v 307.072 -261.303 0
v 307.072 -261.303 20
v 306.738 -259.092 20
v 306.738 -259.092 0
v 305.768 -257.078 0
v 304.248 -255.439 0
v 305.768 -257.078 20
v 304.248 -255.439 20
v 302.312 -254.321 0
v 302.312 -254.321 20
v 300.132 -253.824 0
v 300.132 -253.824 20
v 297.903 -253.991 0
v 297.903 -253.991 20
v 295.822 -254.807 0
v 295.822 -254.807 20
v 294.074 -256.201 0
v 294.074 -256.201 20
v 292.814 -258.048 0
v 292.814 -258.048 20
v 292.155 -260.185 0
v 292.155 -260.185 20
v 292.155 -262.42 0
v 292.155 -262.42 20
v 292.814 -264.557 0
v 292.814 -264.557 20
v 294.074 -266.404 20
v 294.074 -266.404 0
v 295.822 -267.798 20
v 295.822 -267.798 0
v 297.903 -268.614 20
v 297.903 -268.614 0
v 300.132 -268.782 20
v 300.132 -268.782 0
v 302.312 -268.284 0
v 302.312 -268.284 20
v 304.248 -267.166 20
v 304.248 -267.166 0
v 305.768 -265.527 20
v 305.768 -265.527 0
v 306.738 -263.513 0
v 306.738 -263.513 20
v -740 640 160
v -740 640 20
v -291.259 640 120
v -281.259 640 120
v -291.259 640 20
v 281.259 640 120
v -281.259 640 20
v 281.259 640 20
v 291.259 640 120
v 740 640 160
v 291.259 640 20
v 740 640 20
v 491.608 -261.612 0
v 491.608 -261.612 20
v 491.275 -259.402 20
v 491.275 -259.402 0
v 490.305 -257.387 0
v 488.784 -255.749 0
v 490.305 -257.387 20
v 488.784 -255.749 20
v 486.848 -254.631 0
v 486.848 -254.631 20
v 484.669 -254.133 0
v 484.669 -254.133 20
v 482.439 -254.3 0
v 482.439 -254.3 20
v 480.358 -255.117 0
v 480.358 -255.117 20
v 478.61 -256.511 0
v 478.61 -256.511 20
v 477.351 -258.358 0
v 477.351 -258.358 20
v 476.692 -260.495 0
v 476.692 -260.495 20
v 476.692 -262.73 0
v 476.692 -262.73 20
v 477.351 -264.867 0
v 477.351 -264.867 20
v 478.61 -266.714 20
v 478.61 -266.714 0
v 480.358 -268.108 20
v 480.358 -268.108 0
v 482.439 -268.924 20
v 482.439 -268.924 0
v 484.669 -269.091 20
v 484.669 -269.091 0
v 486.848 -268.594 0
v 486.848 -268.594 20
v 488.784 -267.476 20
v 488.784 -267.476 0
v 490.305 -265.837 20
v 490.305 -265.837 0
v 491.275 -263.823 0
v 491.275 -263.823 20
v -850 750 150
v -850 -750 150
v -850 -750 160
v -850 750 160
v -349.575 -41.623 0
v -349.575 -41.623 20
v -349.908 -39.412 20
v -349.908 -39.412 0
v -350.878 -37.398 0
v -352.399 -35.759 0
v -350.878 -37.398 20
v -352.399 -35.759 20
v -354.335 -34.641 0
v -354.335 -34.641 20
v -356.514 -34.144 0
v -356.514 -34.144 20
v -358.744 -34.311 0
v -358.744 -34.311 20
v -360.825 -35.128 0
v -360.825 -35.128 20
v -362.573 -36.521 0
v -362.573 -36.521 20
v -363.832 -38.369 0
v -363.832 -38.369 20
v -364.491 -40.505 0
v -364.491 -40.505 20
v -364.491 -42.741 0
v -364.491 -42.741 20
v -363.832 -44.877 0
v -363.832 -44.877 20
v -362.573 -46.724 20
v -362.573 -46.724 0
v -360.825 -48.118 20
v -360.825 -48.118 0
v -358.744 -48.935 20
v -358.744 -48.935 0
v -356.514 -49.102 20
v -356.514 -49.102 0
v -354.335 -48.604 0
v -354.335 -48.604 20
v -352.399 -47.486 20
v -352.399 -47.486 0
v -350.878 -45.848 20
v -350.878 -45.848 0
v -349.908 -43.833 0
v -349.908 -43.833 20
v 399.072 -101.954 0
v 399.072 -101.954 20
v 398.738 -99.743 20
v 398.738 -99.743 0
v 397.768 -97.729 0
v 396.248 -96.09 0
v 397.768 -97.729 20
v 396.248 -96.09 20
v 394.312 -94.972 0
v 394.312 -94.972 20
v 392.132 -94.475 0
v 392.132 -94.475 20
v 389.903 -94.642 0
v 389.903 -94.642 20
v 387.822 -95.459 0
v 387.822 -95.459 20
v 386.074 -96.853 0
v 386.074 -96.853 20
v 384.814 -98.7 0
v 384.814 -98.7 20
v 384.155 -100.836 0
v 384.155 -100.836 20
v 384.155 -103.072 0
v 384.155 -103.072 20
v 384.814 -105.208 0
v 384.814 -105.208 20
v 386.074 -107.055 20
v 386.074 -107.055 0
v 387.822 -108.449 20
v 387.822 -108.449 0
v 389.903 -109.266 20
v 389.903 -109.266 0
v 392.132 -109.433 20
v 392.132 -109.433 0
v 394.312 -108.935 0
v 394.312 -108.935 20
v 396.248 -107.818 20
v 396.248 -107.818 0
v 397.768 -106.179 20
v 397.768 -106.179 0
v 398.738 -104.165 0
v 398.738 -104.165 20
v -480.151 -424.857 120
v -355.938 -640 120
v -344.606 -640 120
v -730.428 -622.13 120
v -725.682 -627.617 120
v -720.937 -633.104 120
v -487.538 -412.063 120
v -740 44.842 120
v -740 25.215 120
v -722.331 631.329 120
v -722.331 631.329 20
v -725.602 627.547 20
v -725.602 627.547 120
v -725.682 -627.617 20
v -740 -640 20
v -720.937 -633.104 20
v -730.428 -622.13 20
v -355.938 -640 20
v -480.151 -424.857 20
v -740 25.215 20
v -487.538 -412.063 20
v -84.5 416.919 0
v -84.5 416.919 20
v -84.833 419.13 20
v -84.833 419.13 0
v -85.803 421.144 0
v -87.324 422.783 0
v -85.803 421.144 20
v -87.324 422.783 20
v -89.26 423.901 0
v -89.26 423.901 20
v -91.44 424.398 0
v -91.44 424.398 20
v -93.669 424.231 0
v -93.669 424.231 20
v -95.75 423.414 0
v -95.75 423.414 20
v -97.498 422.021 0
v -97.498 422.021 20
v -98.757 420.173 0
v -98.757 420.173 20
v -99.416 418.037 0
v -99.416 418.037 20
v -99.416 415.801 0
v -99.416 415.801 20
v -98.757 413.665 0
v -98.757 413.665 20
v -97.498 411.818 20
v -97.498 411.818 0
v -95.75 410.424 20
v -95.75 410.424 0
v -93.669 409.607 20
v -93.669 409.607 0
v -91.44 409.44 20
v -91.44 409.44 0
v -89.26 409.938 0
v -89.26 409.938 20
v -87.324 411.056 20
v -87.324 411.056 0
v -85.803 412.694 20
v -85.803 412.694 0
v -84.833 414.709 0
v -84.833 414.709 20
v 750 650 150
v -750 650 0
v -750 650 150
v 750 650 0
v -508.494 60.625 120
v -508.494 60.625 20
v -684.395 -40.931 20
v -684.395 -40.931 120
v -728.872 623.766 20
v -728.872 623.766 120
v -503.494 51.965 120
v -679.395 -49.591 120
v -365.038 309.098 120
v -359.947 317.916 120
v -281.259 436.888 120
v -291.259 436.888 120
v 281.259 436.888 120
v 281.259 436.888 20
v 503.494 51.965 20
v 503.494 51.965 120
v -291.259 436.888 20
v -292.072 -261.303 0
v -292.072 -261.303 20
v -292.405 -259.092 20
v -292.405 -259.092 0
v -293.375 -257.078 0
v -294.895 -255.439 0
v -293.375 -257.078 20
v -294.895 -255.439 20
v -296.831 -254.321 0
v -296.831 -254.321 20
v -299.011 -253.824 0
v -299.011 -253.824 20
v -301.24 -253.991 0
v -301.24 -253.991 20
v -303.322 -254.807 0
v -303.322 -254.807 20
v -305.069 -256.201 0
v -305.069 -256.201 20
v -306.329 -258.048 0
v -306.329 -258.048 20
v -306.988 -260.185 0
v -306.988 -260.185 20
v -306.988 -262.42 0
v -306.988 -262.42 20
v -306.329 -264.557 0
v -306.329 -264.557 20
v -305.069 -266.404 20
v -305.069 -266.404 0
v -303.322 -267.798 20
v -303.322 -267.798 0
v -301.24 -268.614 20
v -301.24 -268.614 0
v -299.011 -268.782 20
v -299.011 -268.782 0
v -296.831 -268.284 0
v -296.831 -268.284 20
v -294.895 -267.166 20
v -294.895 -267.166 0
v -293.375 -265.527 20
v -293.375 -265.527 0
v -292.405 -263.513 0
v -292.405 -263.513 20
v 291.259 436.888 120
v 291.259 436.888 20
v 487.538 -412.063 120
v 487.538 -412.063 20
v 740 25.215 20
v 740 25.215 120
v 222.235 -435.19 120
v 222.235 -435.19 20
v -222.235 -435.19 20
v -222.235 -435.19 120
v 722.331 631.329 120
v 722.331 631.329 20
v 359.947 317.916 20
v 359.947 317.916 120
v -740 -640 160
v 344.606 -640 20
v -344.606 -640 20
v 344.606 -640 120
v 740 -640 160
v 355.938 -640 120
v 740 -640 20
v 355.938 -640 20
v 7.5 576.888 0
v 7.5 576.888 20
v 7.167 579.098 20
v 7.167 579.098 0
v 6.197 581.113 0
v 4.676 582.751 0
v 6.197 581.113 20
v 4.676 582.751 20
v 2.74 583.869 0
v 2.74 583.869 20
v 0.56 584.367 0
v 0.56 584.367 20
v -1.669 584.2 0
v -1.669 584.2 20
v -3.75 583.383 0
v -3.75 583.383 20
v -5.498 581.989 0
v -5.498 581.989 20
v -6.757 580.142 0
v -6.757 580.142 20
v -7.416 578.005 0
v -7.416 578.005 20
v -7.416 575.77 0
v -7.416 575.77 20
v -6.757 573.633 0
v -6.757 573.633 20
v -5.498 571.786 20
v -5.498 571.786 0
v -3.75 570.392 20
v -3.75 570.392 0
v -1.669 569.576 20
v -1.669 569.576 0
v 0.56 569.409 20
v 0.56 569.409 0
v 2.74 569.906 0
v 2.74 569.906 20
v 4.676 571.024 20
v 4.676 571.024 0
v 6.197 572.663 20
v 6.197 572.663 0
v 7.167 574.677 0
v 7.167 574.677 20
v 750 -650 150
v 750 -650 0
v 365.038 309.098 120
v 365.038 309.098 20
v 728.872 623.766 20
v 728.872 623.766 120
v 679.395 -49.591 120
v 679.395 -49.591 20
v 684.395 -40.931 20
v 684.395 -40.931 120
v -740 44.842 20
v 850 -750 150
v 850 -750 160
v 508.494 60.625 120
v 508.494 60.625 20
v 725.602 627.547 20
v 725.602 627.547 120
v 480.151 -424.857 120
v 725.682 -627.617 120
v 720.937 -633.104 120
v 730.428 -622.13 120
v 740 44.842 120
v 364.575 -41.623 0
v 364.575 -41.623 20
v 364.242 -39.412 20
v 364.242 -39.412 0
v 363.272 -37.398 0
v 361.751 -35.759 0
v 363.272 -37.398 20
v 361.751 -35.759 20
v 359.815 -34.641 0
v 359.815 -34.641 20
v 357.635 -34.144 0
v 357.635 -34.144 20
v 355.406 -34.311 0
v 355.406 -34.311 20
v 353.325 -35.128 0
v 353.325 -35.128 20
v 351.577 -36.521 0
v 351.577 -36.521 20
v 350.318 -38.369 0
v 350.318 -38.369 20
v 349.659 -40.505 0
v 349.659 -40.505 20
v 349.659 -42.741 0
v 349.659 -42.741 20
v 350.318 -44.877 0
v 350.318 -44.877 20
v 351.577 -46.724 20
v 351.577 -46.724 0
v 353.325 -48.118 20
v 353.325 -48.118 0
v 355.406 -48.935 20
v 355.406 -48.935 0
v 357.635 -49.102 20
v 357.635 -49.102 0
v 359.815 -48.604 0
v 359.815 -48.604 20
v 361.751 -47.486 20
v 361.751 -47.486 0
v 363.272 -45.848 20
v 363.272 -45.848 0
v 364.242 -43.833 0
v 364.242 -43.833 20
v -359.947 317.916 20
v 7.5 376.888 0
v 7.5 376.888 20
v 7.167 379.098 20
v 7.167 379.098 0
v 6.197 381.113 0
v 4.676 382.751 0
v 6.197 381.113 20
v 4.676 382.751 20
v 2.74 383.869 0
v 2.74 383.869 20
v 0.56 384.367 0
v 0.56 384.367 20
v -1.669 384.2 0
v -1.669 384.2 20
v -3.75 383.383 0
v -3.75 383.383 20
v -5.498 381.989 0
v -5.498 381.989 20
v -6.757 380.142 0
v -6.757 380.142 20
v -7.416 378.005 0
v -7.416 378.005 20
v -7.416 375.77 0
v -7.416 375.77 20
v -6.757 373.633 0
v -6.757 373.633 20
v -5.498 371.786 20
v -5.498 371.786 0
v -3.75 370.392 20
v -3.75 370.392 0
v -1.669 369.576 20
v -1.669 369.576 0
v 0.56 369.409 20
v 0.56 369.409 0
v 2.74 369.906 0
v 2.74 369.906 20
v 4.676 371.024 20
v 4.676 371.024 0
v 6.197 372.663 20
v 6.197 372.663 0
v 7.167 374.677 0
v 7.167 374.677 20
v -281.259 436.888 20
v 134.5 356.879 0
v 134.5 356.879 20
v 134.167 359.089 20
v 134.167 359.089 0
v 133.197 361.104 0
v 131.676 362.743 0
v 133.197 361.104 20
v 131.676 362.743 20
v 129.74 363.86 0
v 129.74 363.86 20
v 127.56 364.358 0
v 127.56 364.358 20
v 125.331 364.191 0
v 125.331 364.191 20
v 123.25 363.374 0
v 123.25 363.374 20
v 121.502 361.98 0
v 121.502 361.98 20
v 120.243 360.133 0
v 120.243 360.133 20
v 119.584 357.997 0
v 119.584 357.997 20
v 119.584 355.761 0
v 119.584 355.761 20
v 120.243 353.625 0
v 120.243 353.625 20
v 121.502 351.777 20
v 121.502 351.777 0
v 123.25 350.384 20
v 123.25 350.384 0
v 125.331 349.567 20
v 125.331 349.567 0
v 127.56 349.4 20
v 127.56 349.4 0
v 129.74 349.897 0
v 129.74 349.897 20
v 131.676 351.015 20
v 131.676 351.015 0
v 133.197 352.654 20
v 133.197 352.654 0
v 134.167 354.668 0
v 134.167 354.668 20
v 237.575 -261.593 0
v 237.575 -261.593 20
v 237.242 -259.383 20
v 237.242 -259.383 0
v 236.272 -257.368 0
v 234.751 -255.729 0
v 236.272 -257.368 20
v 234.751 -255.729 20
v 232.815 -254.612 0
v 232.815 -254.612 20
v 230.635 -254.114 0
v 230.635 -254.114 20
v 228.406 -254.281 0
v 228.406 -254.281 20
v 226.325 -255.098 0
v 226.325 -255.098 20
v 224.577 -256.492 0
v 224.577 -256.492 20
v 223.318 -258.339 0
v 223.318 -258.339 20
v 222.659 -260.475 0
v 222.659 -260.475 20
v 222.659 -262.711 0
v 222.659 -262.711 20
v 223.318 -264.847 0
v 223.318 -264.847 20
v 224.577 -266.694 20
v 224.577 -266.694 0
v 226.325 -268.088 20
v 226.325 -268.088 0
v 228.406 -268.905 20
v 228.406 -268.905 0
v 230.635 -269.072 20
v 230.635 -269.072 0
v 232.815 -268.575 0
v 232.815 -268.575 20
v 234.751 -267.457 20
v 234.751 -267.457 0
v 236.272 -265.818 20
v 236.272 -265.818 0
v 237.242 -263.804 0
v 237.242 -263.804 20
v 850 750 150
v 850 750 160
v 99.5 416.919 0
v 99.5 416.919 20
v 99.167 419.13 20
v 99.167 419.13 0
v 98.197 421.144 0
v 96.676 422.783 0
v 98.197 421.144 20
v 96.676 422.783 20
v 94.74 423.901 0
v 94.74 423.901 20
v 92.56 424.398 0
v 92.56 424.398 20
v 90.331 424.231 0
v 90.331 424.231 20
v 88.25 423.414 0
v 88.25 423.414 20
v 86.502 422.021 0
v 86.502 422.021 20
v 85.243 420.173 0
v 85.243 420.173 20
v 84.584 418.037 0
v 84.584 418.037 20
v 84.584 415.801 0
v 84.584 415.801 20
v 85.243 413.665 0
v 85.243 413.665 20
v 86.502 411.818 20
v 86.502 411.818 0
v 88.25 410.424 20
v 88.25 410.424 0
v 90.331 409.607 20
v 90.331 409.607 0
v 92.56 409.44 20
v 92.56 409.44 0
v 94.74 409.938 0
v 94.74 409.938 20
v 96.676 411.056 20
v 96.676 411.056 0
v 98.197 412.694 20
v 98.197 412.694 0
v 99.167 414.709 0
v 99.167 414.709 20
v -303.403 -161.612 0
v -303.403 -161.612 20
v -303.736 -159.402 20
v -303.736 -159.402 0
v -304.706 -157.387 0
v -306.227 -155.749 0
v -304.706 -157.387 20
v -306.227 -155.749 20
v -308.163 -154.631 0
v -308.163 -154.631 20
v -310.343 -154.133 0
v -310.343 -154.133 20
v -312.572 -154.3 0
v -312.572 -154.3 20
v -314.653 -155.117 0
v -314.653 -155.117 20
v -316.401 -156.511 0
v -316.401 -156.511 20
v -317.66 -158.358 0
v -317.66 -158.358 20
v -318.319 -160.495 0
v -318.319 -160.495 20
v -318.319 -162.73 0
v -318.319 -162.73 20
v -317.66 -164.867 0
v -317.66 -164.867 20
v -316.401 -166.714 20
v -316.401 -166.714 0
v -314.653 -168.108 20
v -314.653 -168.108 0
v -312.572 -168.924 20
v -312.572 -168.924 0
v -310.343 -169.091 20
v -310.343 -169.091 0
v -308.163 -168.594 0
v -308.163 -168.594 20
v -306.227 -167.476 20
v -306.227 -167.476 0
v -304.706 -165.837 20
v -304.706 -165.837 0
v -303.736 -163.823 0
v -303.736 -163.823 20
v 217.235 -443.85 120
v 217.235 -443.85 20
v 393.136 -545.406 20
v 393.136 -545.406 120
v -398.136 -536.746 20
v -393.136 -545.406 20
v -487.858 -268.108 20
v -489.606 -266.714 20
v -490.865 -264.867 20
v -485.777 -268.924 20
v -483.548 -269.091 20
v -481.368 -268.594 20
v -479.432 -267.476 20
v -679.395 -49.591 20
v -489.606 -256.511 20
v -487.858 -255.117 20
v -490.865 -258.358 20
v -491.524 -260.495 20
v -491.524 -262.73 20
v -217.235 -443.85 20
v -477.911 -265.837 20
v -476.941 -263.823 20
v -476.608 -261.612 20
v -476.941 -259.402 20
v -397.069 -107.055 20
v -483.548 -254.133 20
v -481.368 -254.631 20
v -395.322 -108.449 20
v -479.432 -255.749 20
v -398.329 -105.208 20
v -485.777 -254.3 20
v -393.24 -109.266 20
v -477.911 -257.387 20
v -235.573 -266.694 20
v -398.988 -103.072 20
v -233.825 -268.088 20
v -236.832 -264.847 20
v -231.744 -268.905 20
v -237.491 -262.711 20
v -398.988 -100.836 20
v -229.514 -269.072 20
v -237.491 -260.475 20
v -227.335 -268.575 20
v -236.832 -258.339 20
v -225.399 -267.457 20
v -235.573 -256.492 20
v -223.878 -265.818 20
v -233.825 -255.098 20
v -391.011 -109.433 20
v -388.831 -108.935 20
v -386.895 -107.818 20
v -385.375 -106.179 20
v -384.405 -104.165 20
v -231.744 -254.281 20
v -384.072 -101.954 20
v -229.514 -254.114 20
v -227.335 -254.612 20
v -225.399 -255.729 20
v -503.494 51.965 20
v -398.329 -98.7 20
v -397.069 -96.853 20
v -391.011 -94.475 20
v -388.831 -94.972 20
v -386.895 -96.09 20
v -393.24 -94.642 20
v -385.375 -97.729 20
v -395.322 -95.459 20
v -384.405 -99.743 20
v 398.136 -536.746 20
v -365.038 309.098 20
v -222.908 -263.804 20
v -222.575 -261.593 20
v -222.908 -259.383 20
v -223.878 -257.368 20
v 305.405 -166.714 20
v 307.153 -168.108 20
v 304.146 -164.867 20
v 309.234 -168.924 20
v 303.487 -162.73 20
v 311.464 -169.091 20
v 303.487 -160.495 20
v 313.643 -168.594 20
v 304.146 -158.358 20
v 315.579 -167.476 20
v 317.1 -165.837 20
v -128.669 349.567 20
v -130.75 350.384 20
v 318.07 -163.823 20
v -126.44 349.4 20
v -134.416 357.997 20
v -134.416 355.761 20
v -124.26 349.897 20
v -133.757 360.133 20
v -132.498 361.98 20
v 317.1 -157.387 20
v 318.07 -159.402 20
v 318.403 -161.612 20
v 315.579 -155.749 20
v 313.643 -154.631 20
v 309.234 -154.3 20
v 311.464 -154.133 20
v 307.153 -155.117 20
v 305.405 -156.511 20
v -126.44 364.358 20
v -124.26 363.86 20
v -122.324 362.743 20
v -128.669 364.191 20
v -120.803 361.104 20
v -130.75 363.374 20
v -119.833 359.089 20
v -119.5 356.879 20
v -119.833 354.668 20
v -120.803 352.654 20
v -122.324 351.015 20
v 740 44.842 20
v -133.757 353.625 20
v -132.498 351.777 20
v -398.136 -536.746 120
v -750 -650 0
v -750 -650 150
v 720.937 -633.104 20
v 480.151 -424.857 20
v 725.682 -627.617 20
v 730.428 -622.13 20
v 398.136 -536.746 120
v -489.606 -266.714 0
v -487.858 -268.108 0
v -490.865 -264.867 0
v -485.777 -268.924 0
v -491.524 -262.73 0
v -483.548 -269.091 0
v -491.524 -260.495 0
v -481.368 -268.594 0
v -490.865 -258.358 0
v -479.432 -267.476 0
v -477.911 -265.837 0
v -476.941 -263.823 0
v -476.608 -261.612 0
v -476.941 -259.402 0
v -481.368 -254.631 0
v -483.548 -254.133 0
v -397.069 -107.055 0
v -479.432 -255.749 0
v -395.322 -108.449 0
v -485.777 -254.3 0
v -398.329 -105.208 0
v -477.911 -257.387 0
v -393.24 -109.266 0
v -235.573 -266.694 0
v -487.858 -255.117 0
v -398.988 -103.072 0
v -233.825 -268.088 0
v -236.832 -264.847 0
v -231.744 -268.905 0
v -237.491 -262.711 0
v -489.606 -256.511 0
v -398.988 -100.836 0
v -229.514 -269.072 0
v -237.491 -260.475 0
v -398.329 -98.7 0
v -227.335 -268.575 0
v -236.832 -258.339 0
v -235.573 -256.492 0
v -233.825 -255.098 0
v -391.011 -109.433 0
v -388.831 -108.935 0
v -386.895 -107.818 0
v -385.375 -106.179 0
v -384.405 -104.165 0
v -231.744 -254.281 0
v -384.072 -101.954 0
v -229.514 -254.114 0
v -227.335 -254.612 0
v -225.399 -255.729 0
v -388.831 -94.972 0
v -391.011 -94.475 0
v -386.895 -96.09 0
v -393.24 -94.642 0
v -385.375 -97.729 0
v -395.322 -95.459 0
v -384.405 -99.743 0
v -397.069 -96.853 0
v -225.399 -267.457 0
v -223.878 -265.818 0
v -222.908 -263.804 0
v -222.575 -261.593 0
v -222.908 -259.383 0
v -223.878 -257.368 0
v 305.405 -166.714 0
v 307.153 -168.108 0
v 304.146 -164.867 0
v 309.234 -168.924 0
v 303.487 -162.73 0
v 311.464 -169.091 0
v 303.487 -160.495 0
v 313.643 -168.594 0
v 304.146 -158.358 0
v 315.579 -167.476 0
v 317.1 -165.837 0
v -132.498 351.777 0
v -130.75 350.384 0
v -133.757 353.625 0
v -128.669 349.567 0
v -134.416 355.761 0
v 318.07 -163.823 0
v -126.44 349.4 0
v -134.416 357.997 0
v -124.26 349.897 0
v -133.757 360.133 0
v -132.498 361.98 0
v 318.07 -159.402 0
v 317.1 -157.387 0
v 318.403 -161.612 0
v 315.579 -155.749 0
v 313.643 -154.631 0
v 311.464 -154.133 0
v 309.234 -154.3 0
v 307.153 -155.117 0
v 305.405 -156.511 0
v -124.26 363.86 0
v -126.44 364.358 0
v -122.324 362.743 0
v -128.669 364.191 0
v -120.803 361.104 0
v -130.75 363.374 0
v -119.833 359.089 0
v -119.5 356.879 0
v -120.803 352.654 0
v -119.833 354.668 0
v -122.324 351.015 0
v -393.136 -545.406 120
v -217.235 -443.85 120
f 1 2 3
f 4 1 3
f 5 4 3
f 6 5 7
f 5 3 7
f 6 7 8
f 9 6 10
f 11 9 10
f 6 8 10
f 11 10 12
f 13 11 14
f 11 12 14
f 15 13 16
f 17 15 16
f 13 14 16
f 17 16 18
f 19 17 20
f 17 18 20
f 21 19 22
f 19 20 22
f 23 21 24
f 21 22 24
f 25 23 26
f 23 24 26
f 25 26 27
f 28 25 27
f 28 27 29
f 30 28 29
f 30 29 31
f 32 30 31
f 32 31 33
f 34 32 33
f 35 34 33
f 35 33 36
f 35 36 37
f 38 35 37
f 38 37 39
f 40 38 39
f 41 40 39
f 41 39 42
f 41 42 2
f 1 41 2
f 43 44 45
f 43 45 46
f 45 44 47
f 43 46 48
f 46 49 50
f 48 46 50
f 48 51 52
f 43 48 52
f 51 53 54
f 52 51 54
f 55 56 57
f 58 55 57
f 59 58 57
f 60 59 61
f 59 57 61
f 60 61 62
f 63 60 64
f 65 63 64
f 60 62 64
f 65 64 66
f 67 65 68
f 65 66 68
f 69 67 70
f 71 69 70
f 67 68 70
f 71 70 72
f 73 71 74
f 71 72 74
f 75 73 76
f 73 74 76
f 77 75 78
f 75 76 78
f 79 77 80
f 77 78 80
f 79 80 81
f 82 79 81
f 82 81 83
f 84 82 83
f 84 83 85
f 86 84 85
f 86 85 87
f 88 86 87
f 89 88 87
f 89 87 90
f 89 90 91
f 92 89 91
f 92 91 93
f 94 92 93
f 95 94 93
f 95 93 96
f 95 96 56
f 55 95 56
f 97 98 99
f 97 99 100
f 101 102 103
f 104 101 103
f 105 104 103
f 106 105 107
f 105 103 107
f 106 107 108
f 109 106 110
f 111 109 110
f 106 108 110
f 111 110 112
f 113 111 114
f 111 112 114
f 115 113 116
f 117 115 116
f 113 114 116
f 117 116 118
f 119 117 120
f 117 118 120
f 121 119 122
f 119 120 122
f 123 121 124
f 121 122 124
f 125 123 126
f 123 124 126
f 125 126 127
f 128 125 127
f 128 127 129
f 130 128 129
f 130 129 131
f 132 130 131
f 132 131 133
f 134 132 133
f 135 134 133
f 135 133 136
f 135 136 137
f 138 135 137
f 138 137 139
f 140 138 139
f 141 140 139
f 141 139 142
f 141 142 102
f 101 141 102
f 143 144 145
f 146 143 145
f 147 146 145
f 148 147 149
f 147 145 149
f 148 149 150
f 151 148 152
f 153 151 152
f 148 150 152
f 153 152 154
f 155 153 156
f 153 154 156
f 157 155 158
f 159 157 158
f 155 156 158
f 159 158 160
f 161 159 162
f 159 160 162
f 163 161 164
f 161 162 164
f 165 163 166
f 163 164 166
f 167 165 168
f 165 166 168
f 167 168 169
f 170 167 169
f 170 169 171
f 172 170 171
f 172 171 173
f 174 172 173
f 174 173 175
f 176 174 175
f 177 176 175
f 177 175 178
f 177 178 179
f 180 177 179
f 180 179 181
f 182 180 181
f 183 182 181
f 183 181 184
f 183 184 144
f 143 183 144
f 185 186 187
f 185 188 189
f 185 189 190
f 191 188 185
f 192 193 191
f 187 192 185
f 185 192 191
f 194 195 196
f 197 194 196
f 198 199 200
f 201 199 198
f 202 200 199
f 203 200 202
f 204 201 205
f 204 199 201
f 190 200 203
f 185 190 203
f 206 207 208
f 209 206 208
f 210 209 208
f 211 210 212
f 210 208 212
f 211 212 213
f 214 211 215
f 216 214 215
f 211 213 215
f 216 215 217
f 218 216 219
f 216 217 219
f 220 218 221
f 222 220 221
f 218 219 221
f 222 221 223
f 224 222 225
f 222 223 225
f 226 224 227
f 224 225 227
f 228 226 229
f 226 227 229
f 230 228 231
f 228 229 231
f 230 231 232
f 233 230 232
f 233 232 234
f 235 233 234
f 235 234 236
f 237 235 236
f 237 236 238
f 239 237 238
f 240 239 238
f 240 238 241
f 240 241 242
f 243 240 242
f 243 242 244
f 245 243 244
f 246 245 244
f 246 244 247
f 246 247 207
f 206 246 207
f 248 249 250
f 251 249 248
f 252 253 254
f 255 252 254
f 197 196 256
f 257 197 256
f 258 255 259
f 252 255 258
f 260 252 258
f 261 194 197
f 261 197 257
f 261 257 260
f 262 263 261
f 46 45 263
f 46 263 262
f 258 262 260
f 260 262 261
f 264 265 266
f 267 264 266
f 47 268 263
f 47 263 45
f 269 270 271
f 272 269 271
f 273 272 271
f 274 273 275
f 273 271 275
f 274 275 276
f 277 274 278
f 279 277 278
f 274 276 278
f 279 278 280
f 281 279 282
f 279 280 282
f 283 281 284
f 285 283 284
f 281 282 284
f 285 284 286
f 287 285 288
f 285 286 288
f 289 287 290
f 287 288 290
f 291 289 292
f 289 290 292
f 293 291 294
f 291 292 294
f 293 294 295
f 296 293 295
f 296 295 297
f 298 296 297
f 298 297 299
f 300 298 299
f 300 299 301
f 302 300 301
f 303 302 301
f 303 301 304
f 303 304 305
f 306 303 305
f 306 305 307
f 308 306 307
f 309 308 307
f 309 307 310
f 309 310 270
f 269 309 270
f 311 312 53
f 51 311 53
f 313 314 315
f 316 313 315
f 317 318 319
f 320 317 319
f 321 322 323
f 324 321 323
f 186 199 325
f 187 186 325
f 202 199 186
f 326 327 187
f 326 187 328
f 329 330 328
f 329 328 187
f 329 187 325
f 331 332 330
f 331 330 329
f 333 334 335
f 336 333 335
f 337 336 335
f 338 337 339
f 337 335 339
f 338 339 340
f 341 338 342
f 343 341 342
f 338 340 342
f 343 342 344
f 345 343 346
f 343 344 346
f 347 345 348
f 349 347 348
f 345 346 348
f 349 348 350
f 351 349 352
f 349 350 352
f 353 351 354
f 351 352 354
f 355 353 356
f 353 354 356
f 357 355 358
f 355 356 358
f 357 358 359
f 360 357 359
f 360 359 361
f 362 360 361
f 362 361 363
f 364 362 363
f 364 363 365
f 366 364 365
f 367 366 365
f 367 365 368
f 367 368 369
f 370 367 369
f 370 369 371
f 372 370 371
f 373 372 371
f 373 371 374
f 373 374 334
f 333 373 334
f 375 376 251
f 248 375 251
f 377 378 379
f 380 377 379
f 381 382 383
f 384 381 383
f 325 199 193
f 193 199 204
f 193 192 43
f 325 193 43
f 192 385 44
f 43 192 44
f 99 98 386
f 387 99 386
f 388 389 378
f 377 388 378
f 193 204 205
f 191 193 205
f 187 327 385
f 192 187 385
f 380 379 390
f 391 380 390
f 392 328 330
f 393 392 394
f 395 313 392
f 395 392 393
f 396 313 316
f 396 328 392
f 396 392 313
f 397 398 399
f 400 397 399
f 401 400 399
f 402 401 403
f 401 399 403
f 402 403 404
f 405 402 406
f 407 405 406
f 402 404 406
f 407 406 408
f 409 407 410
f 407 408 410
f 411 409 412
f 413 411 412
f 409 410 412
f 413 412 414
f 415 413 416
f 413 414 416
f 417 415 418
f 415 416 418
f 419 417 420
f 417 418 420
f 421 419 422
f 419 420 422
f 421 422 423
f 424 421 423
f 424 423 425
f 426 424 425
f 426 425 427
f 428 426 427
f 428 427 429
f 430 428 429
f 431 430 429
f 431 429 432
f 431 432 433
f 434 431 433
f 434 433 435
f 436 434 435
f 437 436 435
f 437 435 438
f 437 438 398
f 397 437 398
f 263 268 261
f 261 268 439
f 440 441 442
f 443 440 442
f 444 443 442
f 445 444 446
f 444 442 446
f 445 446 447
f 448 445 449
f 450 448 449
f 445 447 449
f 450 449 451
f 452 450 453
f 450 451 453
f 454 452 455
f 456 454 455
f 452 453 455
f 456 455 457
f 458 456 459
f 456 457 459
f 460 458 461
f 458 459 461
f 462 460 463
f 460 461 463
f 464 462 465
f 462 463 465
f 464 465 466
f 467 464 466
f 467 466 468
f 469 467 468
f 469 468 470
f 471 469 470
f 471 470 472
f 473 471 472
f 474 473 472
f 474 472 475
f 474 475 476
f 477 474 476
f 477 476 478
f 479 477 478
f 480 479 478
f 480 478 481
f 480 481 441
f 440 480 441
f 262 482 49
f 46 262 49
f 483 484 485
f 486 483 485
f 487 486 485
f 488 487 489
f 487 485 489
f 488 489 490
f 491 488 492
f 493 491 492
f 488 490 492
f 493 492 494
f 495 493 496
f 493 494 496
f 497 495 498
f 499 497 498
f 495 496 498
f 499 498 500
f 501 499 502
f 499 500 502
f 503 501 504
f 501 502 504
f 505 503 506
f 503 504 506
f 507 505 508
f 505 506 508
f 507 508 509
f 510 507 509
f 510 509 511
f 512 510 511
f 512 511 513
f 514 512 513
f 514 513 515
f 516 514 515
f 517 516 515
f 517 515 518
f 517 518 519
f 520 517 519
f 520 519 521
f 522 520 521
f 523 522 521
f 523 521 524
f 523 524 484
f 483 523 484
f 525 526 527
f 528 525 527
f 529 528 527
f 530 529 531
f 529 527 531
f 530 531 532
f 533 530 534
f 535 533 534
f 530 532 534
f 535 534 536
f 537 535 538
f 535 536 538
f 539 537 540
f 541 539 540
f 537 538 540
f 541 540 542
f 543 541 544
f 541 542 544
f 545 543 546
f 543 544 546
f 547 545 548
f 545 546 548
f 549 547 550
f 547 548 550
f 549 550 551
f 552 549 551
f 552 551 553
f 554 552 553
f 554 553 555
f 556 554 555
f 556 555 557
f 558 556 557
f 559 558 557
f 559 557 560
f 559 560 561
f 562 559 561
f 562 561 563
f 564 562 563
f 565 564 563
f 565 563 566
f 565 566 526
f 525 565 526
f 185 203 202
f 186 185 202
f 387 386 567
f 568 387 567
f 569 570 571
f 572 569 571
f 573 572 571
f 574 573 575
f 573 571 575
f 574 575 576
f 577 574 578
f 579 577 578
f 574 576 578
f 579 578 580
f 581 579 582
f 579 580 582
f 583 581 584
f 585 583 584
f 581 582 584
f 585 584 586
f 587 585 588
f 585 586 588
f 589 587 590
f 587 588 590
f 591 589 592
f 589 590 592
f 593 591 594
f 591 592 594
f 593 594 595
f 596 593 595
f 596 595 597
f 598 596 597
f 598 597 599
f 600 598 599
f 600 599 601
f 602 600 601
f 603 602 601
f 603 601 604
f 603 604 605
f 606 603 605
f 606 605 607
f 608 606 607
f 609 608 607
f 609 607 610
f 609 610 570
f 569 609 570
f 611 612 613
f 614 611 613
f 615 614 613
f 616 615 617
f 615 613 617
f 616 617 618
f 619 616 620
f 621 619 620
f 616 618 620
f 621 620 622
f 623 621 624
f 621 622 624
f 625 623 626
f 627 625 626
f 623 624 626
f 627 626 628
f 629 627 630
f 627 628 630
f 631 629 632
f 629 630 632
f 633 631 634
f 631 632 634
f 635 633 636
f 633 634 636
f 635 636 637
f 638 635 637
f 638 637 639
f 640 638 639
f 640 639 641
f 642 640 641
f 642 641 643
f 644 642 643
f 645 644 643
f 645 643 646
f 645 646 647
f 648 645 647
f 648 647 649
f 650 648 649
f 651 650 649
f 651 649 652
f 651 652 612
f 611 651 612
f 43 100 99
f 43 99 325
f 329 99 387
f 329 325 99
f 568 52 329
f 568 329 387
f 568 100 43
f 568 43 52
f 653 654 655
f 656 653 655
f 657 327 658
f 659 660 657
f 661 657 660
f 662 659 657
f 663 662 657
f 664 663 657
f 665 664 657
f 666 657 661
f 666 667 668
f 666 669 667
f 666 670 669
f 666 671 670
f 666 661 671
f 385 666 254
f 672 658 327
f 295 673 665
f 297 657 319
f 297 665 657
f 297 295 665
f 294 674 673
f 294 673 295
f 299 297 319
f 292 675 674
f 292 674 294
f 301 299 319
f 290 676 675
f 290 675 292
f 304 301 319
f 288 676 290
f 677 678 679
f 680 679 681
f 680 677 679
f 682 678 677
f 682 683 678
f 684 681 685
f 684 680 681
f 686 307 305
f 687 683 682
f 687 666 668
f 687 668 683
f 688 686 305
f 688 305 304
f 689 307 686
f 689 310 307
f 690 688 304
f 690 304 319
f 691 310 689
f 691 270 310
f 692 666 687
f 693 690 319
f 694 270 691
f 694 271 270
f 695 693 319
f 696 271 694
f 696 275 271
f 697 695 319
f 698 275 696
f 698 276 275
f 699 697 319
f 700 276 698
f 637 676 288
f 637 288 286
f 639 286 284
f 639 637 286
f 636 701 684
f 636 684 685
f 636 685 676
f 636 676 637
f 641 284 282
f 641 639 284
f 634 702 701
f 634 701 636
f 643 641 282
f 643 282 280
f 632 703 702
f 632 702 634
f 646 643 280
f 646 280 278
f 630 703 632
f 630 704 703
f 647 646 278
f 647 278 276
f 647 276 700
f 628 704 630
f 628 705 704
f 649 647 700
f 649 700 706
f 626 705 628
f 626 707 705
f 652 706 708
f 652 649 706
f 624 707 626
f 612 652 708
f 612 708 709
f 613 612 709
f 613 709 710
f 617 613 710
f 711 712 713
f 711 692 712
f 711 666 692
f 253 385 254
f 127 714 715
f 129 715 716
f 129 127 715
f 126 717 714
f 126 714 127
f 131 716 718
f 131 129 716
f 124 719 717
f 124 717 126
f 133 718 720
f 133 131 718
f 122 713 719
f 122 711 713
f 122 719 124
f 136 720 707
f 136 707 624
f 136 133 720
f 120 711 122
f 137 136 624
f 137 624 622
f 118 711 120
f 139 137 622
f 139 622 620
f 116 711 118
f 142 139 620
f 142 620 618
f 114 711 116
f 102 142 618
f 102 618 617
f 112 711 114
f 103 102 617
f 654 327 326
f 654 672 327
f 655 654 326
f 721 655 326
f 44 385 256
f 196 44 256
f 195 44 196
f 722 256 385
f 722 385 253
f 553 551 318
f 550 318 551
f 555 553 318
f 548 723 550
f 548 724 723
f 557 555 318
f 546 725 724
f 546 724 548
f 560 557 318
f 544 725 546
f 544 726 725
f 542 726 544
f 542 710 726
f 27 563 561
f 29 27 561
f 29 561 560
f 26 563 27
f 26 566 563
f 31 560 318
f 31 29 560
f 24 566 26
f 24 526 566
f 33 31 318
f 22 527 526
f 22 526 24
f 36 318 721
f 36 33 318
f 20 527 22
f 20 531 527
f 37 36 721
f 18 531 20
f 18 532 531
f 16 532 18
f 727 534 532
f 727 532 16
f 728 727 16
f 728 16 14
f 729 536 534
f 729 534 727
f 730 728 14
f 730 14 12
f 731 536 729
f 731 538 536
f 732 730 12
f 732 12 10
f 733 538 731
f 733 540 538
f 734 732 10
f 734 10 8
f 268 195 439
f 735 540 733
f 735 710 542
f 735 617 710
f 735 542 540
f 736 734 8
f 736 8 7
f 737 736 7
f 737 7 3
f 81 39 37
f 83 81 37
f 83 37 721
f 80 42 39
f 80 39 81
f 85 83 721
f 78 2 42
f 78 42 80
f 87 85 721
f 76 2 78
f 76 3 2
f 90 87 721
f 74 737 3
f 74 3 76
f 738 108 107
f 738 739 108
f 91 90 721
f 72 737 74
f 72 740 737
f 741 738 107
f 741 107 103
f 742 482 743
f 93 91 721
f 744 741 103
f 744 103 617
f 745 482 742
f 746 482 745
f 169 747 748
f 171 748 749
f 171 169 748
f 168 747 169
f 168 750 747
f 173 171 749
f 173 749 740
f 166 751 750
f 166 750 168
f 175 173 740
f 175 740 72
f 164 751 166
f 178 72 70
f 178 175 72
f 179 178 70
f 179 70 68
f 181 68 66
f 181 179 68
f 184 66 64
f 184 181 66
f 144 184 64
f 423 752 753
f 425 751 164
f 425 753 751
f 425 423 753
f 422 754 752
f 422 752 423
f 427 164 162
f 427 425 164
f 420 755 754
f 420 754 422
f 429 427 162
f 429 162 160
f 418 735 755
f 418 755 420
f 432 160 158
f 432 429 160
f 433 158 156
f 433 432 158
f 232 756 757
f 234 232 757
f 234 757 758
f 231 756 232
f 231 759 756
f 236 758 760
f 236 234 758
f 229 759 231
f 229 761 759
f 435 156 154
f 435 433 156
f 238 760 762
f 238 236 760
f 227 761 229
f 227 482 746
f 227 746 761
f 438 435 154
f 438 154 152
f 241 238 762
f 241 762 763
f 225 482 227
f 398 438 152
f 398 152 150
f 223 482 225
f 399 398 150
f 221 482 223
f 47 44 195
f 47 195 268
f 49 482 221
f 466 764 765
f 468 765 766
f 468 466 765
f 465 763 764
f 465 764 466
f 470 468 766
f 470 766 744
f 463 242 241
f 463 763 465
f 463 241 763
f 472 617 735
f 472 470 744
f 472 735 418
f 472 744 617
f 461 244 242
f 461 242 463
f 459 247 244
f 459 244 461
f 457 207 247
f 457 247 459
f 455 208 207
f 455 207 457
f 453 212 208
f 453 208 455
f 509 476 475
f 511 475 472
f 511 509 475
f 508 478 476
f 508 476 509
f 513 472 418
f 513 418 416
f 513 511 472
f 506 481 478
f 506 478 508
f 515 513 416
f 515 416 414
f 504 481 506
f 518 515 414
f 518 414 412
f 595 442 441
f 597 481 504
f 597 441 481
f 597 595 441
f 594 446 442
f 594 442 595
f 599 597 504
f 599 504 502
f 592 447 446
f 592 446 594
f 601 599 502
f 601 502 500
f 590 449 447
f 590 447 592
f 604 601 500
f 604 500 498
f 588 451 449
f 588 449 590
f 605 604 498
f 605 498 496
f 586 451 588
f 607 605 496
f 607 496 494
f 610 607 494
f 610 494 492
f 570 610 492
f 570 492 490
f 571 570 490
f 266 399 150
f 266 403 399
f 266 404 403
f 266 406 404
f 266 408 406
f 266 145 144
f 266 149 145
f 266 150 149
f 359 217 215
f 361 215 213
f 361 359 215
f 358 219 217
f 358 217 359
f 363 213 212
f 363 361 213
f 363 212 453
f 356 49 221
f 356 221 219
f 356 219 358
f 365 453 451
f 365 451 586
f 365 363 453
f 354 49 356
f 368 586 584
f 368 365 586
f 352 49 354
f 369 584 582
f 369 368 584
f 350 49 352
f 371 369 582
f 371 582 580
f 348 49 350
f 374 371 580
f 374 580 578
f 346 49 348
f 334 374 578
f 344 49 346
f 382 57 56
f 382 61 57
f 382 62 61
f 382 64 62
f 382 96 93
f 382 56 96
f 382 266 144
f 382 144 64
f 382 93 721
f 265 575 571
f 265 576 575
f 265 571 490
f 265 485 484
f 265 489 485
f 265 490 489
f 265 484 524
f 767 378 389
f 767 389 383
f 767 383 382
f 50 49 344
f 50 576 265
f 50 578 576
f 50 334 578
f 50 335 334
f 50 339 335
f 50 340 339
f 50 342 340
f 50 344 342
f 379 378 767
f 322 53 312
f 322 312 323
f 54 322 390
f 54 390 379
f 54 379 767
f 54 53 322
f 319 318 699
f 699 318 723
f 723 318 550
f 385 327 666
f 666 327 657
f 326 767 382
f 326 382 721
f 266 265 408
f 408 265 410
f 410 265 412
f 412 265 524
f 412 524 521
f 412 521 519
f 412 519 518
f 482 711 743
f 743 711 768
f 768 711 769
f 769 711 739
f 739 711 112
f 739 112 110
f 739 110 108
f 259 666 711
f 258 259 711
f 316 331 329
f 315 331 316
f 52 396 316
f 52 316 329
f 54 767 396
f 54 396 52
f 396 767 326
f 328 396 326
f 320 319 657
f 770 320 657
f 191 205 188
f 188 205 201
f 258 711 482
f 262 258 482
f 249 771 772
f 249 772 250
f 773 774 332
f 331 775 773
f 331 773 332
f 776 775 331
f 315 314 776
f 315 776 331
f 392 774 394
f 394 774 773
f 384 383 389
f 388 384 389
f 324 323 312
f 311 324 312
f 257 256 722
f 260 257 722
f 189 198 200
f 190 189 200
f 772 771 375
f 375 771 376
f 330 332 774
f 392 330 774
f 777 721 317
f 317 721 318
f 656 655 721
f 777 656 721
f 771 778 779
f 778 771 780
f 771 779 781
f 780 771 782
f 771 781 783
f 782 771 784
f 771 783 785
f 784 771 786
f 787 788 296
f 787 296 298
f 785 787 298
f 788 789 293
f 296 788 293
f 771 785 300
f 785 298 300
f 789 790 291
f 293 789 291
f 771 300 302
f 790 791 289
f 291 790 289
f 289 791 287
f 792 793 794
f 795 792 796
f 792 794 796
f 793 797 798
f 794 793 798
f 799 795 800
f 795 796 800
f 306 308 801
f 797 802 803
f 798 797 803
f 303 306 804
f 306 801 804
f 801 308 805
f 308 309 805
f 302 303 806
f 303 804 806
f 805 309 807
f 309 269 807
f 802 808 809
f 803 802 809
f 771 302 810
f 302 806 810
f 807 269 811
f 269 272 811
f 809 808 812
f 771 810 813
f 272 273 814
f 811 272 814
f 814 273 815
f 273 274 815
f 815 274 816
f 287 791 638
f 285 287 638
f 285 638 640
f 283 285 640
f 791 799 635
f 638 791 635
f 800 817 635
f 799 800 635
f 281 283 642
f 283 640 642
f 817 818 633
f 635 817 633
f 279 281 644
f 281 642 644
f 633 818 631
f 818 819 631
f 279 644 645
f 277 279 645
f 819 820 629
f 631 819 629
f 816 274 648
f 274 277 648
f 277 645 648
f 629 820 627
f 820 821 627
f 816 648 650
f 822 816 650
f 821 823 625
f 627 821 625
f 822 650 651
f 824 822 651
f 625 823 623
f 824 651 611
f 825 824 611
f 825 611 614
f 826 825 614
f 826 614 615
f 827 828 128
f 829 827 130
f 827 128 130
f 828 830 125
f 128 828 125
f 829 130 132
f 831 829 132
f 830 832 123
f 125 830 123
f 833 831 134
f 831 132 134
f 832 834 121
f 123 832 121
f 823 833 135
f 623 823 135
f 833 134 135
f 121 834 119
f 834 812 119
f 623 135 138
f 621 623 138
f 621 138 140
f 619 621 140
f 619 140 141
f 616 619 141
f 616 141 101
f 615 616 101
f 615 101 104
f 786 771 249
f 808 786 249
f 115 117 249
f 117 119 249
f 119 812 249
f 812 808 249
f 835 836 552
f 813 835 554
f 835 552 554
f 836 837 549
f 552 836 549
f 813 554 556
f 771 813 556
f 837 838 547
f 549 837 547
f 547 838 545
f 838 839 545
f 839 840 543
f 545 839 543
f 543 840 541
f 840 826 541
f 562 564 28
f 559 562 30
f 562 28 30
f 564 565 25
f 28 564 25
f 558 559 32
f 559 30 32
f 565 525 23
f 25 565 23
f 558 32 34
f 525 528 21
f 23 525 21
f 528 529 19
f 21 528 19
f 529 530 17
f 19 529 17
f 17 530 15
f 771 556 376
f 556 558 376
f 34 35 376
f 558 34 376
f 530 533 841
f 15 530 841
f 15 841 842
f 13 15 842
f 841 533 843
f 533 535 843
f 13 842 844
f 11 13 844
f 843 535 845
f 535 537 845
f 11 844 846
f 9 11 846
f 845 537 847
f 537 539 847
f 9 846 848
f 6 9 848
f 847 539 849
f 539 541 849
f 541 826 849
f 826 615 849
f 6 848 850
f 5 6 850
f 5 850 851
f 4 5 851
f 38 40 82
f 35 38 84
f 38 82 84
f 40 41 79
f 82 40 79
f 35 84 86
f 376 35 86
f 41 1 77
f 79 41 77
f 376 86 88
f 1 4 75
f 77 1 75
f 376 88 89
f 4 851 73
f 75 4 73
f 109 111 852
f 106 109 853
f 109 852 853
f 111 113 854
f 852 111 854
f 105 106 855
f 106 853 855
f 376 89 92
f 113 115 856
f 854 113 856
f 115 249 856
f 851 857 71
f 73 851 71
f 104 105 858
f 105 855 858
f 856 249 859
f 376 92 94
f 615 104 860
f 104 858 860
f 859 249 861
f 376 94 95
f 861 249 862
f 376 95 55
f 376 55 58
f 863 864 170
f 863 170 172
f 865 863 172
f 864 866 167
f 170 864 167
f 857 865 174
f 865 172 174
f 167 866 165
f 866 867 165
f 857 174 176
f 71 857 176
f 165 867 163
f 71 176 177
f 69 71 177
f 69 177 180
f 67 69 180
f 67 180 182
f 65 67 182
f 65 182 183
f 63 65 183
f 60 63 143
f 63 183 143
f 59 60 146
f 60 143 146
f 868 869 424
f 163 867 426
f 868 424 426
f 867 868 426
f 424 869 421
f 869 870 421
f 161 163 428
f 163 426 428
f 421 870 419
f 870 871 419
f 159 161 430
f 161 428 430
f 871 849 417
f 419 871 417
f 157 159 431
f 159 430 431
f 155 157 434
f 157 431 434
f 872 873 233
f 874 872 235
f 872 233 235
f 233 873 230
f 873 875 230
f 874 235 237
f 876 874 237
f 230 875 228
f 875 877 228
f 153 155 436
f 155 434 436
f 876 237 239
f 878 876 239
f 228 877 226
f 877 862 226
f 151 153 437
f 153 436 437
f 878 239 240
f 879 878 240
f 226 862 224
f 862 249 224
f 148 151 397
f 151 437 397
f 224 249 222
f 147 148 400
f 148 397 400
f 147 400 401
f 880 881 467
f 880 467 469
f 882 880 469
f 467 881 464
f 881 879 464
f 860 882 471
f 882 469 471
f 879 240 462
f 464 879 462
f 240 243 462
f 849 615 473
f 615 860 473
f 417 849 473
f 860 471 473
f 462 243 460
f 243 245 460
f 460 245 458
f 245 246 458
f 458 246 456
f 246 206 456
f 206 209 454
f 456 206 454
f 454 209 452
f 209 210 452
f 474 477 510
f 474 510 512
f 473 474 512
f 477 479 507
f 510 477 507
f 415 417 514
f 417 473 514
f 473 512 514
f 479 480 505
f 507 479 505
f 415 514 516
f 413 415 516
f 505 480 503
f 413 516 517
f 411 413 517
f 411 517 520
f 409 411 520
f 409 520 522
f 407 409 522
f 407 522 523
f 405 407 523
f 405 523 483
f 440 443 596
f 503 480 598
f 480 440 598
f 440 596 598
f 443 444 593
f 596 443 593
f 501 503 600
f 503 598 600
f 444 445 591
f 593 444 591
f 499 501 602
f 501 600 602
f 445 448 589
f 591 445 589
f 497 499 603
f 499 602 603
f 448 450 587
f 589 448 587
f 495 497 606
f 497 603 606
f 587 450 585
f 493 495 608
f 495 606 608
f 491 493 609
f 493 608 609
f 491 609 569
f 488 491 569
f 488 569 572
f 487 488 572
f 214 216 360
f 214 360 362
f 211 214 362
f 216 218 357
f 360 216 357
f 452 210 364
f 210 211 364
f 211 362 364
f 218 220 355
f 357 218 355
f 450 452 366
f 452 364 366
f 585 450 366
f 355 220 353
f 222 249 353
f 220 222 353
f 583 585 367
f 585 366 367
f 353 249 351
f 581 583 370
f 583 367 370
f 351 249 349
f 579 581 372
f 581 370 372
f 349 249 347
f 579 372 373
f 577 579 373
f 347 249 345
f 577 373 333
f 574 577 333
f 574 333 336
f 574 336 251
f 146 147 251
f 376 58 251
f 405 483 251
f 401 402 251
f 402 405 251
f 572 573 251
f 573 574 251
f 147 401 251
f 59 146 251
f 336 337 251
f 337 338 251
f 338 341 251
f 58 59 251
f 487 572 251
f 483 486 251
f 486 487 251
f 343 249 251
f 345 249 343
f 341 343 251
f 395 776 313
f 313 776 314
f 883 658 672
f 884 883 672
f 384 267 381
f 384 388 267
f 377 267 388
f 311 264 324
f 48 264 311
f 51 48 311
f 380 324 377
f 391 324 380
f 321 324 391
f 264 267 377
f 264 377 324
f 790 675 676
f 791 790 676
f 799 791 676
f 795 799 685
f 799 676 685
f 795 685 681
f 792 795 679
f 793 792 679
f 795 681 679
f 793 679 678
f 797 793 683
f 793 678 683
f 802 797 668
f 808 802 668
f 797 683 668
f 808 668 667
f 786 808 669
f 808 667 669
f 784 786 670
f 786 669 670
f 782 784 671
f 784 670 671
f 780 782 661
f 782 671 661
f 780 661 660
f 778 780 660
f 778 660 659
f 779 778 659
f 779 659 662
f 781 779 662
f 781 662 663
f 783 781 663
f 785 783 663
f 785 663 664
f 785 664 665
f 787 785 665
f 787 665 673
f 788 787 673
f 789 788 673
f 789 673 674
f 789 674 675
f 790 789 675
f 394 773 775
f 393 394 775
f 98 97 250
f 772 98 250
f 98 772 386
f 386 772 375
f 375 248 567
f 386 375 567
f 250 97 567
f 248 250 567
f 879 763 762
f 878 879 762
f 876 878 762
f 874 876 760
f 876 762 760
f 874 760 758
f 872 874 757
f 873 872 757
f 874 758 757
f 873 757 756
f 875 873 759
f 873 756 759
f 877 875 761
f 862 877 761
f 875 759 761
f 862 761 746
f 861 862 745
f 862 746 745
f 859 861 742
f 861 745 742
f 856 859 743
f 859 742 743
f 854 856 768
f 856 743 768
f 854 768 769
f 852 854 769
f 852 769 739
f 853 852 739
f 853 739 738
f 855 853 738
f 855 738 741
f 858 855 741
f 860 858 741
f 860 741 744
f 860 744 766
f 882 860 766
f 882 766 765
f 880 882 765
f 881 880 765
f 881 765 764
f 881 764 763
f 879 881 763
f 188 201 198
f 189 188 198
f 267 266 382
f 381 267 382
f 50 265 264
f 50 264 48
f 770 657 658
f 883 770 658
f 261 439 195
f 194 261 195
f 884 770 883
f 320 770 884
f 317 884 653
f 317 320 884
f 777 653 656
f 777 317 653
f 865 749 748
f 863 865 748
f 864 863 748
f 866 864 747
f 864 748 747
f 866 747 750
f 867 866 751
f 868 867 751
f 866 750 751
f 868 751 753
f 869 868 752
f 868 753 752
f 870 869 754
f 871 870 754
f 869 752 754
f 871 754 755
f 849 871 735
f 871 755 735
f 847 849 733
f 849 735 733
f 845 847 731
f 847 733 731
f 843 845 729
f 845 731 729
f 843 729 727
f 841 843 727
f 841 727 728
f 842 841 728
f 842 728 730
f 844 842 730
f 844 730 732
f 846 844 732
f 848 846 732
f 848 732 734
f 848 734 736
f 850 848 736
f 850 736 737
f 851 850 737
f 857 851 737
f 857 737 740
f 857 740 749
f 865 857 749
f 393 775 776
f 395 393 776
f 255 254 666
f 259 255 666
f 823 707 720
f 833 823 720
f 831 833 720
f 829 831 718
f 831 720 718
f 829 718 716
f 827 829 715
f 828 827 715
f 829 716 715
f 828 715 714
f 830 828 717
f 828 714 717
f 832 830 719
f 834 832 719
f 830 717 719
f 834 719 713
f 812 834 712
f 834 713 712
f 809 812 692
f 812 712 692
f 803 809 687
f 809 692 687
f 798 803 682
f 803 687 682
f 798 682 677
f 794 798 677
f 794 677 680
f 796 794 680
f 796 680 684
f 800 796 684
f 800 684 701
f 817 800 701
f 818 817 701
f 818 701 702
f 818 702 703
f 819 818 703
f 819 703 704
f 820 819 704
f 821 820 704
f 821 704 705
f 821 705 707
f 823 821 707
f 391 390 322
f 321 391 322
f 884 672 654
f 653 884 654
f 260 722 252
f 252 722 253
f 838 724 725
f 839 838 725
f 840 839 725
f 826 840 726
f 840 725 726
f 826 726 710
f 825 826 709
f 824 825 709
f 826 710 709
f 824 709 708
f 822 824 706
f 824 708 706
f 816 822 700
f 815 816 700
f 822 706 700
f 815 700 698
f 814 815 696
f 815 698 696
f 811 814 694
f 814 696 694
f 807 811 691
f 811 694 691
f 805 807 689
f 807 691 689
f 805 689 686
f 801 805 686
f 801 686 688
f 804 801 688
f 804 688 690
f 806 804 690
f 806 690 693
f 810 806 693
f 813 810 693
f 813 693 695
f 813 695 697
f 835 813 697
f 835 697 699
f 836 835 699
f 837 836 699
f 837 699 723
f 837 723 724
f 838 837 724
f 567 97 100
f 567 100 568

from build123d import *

# Parameters (mm, degrees)
F0_W     = 1500
F0_H     = 1300
F1_DEPTH = 150
F2_W     = 1480
F2_H     = 1280
F3_DEPTH = 130
F4_W     = 1700
F4_H     = 1500
F4_W_2   = 1480
F4_H_2   = 1280
F5_DEPTH = 10
F6_R     = 7.5
F7_DEPTH = 20.001
F8_W     = 10
F8_H     = 203.1123805046
F9_DEPTH = 100


with BuildPart() as f1:
    # F0 (on Top) → F1 (new body)
    with BuildSketch(Plane.XY):
        Rectangle(F0_W, F0_H)
    extrude(amount=F1_DEPTH)

    # F2 (on face) → F3 (cut)
    with BuildSketch(Plane.XY.offset(150)):
        Rectangle(F2_W, F2_H)
    extrude(amount=-F3_DEPTH, mode=Mode.SUBTRACT)

    # F4 (on face) → F5 (join)
    with BuildSketch(Plane.XY.offset(150)):
        Rectangle(F4_W, F4_H)
        Rectangle(F4_W_2, F4_H_2, mode=Mode.SUBTRACT)
    extrude(amount=F5_DEPTH)

    # F6 (on face) → F7 (cut, through all)
    with BuildSketch(Plane.XY.offset(20)):
        with Locations((0, 576.8876194954)):
            Circle(F6_R)
        with Locations((-484.1082007155, -261.6123805046)):
            Circle(F6_R)
        with Locations((484.1082007155, -261.6123805046)):
            Circle(F6_R)
        with Locations((-92, 416.9192598449)):
            Circle(F6_R)
        with Locations((92, 416.9192598449)):
            Circle(F6_R)
        with Locations((-127, 356.8787698224)):
            Circle(F6_R)
        with Locations((127, 356.8787698224)):
            Circle(F6_R)
        with Locations((-230.0749478413, -261.5931819487)):
            Circle(F6_R)
        with Locations((-357.0749478413, -41.6227293875)):
            Circle(F6_R)
        with Locations((-299.5715374564, -261.3025378275)):
            Circle(F6_R)
        with Locations((-391.5715374564, -101.9538635312)):
            Circle(F6_R)
        with Locations((391.5715374564, -101.9538635312)):
            Circle(F6_R)
        with Locations((299.5715374564, -261.3025378275)):
            Circle(F6_R)
        with Locations((230.0749478413, -261.5931819487)):
            Circle(F6_R)
        with Locations((357.0749478413, -41.6227293875)):
            Circle(F6_R)
        with Locations((0, 376.8876194954)):
            Circle(F6_R)
        with Locations((310.9031199586, -161.6123805046)):
            Circle(F6_R)
        with Locations((-310.9031199586, -161.6123805046)):
            Circle(F6_R)
    extrude(amount=-F7_DEPTH, mode=Mode.SUBTRACT)

    # F8 (on face) → F9 (join)
    with BuildSketch(Plane.XY.offset(20)):
        with Locations((-286.2588901058, 538.4438097477)):
            Rectangle(F8_W, F8_H)
        Polygon((-503.4940892386, 51.9649633672), (-281.2588901058, 436.8876194954), (-291.2588901058, 436.8876194954), (-359.9470881013, 317.9161706869), (-365.0381898631, 309.0981237688), (-508.4940892386, 60.6252174051), (-684.3945705787, -40.9309728472), (-679.3945705787, -49.5912268851), align=None)
        Polygon((-365.0381898631, 309.0981237688), (-359.9470881013, 317.9161706869), (-722.3309758605, 631.329262803), (-725.6017355252, 627.5474469407), (-728.8724951898, 623.7656310784), align=None)
        with Locations((286.2588901058, 538.4438097477)):
            Rectangle(F8_W, F8_H)
        Polygon((359.9470881013, 317.9161706869), (291.2588901058, 436.8876194954), (281.2588901058, 436.8876194954), (503.4940892386, 51.9649633672), (508.4940892386, 60.6252174051), (365.0381898631, 309.0981237688), align=None)
        Polygon((722.3309758605, 631.329262803), (359.9470881013, 317.9161706869), (365.0381898631, 309.0981237688), (728.8724951898, 623.7656310784), (725.6017355252, 627.5474469407), align=None)
        Polygon((508.4940892386, 60.6252174051), (503.4940892386, 51.9649633672), (679.3945705787, -49.5912268851), (684.3945705787, -40.9309728472), align=None)
        Polygon((217.2351991328, -443.8499784143), (393.1356804729, -545.4061686666), (398.1356804729, -536.7459146288), (222.2351991328, -435.1897243764), (0, -435.1897243764), (-222.2351991328, -435.1897243764), (-398.1356804729, -536.7459146288), (-393.1356804729, -545.4061686666), (-217.2351991328, -443.8499784143), (0, -443.8499784143), align=None)
        Polygon((-344.6060815022, -640), (-740, 44.842355842), (-748.4989762306, 39.9354696274), (-487.5375583846, -412.0629648972), (-480.1509961227, -424.856866028), (-353.1050577328, -644.9068862146), align=None)
        Polygon((-480.1509961227, -424.856866028), (-487.5375583846, -412.0629648972), (-730.4277149046, -622.1301272929), (-725.6822450561, -627.6170768052), (-720.9367752075, -633.1040263176), align=None)
        Polygon((748.4989762306, 39.9354696274), (740, 44.842355842), (344.6060815022, -640), (353.1050577328, -644.9068862146), (480.1509961227, -424.856866028), (487.5375583846, -412.0629648972), align=None)
        Polygon((730.4277149046, -622.1301272929), (487.5375583846, -412.0629648972), (480.1509961227, -424.856866028), (720.9367752075, -633.1040263176), (725.6822450561, -627.6170768052), align=None)
    extrude(amount=F9_DEPTH)


solid = f1.part
